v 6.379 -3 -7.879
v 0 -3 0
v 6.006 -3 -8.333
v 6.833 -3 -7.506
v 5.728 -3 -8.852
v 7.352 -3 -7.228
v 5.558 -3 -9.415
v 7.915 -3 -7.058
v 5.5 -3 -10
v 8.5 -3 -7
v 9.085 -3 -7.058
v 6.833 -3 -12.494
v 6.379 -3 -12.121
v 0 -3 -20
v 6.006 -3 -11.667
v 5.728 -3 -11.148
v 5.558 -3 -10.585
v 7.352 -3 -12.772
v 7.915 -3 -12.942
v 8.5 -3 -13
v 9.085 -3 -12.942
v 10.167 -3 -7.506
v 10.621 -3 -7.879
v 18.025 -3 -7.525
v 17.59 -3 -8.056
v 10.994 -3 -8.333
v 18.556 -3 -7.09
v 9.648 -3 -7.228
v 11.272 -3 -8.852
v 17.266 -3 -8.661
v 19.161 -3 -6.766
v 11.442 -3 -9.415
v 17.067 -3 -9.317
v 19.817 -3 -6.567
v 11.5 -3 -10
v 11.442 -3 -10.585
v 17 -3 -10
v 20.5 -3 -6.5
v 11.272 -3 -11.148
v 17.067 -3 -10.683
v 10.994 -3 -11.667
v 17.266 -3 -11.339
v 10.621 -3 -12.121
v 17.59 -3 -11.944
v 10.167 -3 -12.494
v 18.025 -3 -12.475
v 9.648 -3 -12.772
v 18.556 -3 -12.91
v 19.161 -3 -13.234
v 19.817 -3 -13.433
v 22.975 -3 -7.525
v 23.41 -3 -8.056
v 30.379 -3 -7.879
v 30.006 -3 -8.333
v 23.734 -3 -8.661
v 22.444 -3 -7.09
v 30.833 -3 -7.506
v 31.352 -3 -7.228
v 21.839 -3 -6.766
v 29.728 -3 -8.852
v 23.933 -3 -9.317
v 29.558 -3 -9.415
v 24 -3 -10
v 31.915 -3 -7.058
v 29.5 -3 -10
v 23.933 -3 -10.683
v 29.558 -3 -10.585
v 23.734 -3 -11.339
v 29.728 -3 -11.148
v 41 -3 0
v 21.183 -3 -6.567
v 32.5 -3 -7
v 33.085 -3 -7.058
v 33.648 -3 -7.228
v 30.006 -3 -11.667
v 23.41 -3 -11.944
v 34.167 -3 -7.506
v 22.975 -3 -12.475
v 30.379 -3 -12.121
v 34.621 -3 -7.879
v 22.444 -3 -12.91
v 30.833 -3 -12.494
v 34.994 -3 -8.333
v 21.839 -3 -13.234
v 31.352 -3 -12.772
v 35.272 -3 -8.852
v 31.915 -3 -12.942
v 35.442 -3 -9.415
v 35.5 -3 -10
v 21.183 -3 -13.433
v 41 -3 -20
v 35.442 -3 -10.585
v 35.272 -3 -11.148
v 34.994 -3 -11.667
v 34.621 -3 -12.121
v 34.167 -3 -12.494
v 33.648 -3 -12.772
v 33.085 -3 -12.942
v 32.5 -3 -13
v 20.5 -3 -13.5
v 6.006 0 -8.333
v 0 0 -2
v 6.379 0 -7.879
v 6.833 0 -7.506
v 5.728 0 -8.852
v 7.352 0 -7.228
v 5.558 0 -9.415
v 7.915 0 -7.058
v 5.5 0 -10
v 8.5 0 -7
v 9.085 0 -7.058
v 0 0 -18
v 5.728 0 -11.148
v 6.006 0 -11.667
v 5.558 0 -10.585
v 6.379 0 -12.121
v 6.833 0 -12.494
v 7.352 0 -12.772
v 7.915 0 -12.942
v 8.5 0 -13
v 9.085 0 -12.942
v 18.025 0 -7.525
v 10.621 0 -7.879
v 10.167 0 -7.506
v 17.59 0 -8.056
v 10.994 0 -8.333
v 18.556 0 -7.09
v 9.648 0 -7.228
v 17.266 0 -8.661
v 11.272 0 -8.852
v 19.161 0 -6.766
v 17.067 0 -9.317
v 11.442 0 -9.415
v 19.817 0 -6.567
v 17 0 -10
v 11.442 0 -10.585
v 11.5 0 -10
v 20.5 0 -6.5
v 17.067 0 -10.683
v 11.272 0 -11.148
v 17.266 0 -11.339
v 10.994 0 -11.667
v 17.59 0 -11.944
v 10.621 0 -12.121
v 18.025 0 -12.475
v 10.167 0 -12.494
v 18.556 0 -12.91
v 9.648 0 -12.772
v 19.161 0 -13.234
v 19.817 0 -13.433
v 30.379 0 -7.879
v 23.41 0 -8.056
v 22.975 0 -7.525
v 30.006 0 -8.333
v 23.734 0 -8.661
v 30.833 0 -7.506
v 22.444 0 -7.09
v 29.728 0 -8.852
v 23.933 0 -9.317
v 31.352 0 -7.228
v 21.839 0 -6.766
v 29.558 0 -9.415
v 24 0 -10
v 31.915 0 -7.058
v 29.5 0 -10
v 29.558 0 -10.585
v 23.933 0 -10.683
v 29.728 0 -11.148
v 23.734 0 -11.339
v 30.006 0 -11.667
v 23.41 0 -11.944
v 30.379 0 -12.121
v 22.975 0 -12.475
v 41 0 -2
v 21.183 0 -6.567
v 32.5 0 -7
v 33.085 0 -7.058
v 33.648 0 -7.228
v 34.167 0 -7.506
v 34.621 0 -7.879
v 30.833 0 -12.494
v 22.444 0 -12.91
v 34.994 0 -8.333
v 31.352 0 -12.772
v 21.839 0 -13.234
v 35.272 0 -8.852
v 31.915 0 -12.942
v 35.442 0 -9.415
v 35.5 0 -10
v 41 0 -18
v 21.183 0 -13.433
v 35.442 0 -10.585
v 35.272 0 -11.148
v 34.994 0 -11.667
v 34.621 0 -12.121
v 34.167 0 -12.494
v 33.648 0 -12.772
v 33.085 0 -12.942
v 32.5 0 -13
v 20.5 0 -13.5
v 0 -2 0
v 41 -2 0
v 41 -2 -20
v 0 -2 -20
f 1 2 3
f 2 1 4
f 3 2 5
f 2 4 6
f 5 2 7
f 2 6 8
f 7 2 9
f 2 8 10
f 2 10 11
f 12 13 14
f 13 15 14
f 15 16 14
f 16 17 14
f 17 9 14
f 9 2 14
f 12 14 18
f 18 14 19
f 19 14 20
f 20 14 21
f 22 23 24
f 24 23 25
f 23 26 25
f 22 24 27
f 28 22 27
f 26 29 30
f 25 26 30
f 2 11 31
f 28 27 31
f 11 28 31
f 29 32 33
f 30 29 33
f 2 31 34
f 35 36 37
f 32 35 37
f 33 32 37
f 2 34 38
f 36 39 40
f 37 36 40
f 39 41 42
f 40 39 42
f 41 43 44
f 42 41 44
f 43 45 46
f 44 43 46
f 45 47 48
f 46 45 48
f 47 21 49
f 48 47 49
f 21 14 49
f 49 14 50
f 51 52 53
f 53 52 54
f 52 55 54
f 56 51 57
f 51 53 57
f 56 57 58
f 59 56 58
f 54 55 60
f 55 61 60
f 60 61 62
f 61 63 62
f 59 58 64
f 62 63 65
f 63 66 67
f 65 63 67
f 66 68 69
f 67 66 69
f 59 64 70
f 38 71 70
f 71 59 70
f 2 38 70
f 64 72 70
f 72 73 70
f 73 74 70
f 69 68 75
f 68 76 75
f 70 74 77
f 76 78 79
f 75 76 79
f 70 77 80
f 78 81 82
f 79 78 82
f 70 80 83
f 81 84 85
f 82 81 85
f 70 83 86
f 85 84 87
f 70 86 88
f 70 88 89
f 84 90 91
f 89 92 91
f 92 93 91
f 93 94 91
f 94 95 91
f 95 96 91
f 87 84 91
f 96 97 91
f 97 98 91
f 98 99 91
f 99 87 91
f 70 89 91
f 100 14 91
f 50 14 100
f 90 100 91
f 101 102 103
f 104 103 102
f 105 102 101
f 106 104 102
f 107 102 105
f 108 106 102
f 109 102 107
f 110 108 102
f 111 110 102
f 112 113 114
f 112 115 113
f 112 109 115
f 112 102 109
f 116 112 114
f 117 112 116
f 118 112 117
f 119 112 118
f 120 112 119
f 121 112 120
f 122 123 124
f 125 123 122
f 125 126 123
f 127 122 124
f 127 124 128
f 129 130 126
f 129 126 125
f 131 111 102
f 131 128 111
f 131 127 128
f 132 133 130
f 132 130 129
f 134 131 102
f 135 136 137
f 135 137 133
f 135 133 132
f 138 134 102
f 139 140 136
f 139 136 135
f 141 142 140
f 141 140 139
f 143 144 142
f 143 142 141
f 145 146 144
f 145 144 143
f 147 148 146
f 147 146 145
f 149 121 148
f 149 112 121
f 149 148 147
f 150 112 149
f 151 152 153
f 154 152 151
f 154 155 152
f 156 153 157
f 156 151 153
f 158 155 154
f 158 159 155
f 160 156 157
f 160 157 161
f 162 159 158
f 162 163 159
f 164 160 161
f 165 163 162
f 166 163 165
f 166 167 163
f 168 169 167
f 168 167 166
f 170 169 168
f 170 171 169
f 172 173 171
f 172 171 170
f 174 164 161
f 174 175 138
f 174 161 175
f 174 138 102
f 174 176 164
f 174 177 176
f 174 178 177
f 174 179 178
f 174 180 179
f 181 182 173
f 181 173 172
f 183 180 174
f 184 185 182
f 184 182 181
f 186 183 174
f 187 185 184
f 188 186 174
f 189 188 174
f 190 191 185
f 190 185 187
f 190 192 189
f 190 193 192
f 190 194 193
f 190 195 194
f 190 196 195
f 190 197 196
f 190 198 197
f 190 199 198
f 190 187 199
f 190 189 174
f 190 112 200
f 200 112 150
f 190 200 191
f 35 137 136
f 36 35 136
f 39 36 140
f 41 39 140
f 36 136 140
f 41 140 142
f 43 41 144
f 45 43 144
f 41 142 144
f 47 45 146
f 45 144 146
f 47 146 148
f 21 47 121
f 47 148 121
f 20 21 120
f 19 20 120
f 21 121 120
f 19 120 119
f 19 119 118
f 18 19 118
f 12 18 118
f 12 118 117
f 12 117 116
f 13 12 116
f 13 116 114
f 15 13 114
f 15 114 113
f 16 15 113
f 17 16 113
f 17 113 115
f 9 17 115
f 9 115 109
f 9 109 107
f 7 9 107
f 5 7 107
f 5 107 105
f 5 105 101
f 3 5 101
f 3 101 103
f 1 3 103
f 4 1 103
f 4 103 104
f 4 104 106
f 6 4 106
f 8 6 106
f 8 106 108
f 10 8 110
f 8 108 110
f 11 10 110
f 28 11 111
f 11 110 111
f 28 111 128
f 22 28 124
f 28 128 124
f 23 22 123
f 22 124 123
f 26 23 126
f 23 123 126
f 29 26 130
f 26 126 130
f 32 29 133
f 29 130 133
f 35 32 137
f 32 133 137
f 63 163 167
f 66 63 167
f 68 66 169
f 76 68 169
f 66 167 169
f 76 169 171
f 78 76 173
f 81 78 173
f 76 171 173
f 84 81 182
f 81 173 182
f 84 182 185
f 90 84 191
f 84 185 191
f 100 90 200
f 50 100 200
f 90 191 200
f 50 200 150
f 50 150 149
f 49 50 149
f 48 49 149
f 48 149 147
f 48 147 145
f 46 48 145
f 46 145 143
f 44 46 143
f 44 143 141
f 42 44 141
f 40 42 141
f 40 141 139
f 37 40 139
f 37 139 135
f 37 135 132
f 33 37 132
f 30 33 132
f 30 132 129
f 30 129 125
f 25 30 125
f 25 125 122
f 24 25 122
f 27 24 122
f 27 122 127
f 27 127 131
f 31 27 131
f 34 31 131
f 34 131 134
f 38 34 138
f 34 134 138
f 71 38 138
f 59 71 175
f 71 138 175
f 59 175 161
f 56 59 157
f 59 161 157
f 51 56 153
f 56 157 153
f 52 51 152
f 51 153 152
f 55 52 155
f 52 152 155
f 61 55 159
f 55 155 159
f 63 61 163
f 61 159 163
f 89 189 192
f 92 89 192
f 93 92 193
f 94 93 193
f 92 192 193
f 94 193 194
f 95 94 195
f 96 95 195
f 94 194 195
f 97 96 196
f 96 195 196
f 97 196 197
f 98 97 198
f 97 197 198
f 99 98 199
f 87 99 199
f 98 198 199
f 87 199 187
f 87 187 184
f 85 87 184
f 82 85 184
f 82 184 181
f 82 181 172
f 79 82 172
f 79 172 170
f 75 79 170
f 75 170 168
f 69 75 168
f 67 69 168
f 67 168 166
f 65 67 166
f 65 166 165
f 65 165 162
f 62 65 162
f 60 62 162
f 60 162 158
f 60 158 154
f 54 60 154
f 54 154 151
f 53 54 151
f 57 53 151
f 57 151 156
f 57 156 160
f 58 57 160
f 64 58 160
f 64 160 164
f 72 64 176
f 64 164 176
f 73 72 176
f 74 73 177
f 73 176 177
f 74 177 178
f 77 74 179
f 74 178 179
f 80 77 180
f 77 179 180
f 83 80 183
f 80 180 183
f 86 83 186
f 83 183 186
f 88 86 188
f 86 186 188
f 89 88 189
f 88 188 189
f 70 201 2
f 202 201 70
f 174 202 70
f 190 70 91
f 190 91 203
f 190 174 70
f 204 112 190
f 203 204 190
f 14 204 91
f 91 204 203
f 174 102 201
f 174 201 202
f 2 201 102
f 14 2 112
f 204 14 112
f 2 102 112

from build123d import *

# Parameters (mm, degrees)
SKETCH1_W           = 41
SKETCH1_H           = 20
BOSS_EXTRUDE1_DEPTH = 3
SKETCH7_R           = 3
SKETCH7_R_2         = 3.5
HOLES_DEPTH         = 4
CHAMFER1_SIZE       = 2


with BuildPart() as part:
    # Sketch1 → Boss-Extrude1 (new body)
    with BuildSketch(Plane(origin=(0, 0, 0), x_dir=(1, 0, 0), z_dir=(0, 1, 0))):
        with Locations((20.5, 10)):
            Rectangle(SKETCH1_W, SKETCH1_H)
    extrude(amount=-BOSS_EXTRUDE1_DEPTH)

    # Sketch7 → holes (cut, through all)
    with BuildSketch(Plane(origin=(0, 0, 0), x_dir=(1, 0, 0), z_dir=(0, 1, 0))):
        with Locations((8.5, 10)):
            Circle(SKETCH7_R)
        with Locations((32.5, 10)):
            Circle(SKETCH7_R)
        with Locations((20.5, 10)):
            Circle(SKETCH7_R_2)
    extrude(amount=-HOLES_DEPTH, mode=Mode.SUBTRACT)

    # Chamfer1
    chamfer1_edges = [part.edges().sort_by_distance(p)[0] for p in [
        (20.5, 0, 0),
        (20.5, 0, -20),
    ]]
    chamfer(chamfer1_edges, length=CHAMFER1_SIZE)


solid = part.part
